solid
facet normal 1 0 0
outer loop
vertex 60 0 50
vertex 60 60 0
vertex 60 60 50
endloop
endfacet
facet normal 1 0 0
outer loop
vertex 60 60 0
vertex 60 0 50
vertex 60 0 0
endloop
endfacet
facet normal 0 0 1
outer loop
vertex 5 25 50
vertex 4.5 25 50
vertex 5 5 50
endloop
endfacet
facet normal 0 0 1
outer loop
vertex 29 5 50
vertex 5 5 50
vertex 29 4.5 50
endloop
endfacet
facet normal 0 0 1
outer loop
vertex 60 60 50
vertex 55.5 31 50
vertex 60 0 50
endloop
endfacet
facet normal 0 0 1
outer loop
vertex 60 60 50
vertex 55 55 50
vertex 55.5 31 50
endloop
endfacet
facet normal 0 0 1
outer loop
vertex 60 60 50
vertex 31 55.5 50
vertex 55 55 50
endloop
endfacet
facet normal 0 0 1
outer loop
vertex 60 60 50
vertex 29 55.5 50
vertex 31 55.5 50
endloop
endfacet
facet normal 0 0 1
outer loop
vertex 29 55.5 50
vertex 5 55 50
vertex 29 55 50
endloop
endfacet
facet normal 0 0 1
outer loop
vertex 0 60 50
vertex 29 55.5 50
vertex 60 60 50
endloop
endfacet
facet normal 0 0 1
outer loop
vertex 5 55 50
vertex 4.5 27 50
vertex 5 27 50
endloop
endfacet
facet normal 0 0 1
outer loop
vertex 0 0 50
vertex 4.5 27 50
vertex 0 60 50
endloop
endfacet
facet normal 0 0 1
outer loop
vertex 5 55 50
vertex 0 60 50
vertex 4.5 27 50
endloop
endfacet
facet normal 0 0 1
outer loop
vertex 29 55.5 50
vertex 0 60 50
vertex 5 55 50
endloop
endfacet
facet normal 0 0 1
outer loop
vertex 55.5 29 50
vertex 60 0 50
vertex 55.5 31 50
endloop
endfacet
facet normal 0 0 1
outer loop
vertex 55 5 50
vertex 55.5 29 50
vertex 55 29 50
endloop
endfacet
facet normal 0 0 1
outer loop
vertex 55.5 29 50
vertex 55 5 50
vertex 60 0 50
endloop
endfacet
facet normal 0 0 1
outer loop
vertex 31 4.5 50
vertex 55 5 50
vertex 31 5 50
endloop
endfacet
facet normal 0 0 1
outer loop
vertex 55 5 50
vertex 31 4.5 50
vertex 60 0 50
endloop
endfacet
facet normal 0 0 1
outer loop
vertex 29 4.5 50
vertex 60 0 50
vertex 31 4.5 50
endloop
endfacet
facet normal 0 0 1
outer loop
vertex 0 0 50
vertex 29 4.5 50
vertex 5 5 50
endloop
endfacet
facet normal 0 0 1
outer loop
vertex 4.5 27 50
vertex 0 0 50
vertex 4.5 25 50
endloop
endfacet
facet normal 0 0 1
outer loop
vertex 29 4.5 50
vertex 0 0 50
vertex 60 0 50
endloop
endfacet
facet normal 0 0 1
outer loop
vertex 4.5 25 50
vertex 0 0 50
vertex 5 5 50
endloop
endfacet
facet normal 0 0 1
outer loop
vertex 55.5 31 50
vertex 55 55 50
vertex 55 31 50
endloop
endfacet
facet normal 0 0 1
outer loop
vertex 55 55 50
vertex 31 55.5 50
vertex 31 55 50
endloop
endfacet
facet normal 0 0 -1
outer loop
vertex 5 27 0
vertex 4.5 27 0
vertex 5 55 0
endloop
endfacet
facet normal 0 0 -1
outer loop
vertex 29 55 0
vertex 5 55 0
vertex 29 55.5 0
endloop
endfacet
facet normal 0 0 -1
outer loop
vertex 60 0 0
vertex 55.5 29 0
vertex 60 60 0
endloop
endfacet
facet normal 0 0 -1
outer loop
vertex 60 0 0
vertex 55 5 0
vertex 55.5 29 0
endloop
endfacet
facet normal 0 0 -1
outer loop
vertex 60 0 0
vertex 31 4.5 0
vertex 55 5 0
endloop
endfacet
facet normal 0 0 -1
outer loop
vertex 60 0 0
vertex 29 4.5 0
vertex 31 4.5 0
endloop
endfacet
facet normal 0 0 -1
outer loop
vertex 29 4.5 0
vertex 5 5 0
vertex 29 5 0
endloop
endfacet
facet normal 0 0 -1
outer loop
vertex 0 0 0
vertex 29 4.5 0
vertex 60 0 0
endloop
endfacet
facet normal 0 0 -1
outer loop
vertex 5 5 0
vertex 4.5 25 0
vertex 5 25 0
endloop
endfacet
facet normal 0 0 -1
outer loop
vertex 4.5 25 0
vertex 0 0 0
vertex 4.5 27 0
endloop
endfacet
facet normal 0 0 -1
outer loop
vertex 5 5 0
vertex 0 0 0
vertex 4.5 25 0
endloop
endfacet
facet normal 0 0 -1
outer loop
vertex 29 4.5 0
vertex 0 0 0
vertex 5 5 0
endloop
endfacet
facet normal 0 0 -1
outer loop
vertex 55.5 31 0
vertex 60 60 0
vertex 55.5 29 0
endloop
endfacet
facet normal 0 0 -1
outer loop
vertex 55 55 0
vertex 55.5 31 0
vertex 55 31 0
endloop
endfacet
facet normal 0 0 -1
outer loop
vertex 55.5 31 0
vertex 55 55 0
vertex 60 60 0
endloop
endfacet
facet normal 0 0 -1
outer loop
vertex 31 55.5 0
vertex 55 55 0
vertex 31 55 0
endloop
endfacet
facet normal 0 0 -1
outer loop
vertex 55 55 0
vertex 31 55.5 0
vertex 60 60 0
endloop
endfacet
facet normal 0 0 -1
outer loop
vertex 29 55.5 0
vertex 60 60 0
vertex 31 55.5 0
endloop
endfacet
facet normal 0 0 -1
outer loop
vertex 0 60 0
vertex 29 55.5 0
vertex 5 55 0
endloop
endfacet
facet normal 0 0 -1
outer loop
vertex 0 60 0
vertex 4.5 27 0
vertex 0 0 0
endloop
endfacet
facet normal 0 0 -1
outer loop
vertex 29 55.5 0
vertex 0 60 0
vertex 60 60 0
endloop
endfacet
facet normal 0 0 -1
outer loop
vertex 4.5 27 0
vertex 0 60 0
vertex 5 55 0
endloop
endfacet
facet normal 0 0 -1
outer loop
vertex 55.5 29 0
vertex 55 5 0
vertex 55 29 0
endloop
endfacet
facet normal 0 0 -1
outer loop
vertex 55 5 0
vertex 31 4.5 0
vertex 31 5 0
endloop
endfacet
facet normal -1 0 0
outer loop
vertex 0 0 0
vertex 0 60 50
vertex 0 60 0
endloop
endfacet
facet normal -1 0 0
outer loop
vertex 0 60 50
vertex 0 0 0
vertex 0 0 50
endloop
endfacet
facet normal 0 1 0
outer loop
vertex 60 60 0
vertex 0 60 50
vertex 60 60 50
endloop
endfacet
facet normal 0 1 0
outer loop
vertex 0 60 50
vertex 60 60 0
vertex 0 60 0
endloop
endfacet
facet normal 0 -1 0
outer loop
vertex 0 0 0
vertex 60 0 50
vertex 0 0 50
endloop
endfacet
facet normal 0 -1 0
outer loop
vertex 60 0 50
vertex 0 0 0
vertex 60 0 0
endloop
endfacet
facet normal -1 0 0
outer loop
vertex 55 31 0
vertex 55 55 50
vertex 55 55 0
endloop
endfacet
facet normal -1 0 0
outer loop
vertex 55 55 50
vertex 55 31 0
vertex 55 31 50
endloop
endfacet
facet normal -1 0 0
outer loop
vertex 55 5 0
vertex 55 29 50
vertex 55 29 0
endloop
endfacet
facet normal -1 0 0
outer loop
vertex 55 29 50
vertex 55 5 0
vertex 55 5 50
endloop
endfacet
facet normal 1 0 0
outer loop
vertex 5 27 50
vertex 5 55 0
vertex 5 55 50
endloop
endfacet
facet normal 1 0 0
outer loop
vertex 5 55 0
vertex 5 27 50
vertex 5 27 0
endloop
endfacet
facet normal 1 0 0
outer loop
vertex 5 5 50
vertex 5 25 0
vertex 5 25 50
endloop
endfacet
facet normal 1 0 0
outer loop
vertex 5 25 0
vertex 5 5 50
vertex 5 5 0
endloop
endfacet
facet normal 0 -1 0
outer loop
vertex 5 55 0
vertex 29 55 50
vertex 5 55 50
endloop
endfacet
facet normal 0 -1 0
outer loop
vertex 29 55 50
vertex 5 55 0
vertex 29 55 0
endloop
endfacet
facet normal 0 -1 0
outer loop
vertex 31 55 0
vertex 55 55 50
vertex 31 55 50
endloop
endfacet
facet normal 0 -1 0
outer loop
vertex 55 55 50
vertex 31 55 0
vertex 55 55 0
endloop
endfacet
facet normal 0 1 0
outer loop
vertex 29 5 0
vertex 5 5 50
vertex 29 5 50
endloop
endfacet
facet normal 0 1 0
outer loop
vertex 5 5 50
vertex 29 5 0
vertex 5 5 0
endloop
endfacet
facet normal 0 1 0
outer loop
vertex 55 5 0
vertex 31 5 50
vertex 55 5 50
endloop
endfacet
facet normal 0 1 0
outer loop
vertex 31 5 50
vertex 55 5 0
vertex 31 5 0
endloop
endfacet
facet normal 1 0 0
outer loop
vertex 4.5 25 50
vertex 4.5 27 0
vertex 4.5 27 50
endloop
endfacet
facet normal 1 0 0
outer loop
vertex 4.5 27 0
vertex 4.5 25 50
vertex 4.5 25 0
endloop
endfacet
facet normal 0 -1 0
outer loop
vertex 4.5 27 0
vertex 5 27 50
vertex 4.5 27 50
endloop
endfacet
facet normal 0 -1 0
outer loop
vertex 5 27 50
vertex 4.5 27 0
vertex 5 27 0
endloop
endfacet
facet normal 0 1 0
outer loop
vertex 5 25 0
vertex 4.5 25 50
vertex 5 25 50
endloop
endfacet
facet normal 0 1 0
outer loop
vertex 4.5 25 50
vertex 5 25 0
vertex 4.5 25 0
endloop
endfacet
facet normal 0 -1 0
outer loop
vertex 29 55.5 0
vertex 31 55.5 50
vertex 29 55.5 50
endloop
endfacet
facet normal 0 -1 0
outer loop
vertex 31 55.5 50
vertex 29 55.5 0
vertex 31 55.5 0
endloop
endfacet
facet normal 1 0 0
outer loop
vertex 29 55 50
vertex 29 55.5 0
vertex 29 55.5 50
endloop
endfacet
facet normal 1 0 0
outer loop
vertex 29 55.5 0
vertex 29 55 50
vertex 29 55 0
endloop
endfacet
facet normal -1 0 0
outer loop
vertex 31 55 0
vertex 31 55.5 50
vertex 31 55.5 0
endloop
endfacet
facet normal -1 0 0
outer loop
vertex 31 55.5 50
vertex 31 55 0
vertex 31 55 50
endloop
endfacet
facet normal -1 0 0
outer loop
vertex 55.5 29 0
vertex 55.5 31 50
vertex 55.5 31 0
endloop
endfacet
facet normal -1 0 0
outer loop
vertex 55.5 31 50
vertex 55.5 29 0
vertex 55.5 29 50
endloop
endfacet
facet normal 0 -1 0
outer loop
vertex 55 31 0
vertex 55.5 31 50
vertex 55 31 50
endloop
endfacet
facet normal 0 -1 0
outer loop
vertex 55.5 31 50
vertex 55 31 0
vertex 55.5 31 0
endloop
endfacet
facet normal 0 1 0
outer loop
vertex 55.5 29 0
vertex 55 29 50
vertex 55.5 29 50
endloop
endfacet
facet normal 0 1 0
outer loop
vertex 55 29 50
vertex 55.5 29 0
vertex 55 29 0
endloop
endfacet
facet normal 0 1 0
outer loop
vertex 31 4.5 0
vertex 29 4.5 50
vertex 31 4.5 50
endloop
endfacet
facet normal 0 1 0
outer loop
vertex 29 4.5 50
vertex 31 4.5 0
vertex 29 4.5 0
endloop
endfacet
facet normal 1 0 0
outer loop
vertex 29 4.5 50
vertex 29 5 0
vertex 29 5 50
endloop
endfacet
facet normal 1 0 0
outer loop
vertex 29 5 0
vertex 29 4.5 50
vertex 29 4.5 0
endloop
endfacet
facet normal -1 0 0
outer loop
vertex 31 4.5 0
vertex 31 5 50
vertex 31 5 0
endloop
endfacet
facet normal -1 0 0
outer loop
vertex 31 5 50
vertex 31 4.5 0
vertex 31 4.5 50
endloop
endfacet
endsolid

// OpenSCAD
// Test square
//
// Generate STL using OpenSCAD:
//   openscad square.scad -o square.stl

square_width = 5;
square_size = 60;
square_height = 50;

module hollow_square() {
    difference() {
        cube([square_size, square_size, square_height]);
        translate([square_width, square_width, -1])
            cube([square_size-2*square_width, square_size-2*square_width,
                  square_height+2]);
    }
}

module notch() {
    CUT = 0.01;
    depth = .5;
    width = 1;
    translate([-depth, -width, -CUT])
        cube([2*depth, 2*width, square_height + 2*CUT]);
}

module square_with_notches() {
    difference() {
        // Start with initial square
        hollow_square();
        // Remove four notches on inside perimeter
        translate([square_width, square_size/2 - 4, 0])
            notch();
        translate([square_size/2, square_size - square_width, 0])
            rotate([0, 0, 90])
                notch();
        translate([square_size - square_width, square_size/2, 0])
            notch();
        translate([square_size/2, square_width, 0])
            rotate([0, 0, 90])
                notch();
    }
}

square_with_notches();
